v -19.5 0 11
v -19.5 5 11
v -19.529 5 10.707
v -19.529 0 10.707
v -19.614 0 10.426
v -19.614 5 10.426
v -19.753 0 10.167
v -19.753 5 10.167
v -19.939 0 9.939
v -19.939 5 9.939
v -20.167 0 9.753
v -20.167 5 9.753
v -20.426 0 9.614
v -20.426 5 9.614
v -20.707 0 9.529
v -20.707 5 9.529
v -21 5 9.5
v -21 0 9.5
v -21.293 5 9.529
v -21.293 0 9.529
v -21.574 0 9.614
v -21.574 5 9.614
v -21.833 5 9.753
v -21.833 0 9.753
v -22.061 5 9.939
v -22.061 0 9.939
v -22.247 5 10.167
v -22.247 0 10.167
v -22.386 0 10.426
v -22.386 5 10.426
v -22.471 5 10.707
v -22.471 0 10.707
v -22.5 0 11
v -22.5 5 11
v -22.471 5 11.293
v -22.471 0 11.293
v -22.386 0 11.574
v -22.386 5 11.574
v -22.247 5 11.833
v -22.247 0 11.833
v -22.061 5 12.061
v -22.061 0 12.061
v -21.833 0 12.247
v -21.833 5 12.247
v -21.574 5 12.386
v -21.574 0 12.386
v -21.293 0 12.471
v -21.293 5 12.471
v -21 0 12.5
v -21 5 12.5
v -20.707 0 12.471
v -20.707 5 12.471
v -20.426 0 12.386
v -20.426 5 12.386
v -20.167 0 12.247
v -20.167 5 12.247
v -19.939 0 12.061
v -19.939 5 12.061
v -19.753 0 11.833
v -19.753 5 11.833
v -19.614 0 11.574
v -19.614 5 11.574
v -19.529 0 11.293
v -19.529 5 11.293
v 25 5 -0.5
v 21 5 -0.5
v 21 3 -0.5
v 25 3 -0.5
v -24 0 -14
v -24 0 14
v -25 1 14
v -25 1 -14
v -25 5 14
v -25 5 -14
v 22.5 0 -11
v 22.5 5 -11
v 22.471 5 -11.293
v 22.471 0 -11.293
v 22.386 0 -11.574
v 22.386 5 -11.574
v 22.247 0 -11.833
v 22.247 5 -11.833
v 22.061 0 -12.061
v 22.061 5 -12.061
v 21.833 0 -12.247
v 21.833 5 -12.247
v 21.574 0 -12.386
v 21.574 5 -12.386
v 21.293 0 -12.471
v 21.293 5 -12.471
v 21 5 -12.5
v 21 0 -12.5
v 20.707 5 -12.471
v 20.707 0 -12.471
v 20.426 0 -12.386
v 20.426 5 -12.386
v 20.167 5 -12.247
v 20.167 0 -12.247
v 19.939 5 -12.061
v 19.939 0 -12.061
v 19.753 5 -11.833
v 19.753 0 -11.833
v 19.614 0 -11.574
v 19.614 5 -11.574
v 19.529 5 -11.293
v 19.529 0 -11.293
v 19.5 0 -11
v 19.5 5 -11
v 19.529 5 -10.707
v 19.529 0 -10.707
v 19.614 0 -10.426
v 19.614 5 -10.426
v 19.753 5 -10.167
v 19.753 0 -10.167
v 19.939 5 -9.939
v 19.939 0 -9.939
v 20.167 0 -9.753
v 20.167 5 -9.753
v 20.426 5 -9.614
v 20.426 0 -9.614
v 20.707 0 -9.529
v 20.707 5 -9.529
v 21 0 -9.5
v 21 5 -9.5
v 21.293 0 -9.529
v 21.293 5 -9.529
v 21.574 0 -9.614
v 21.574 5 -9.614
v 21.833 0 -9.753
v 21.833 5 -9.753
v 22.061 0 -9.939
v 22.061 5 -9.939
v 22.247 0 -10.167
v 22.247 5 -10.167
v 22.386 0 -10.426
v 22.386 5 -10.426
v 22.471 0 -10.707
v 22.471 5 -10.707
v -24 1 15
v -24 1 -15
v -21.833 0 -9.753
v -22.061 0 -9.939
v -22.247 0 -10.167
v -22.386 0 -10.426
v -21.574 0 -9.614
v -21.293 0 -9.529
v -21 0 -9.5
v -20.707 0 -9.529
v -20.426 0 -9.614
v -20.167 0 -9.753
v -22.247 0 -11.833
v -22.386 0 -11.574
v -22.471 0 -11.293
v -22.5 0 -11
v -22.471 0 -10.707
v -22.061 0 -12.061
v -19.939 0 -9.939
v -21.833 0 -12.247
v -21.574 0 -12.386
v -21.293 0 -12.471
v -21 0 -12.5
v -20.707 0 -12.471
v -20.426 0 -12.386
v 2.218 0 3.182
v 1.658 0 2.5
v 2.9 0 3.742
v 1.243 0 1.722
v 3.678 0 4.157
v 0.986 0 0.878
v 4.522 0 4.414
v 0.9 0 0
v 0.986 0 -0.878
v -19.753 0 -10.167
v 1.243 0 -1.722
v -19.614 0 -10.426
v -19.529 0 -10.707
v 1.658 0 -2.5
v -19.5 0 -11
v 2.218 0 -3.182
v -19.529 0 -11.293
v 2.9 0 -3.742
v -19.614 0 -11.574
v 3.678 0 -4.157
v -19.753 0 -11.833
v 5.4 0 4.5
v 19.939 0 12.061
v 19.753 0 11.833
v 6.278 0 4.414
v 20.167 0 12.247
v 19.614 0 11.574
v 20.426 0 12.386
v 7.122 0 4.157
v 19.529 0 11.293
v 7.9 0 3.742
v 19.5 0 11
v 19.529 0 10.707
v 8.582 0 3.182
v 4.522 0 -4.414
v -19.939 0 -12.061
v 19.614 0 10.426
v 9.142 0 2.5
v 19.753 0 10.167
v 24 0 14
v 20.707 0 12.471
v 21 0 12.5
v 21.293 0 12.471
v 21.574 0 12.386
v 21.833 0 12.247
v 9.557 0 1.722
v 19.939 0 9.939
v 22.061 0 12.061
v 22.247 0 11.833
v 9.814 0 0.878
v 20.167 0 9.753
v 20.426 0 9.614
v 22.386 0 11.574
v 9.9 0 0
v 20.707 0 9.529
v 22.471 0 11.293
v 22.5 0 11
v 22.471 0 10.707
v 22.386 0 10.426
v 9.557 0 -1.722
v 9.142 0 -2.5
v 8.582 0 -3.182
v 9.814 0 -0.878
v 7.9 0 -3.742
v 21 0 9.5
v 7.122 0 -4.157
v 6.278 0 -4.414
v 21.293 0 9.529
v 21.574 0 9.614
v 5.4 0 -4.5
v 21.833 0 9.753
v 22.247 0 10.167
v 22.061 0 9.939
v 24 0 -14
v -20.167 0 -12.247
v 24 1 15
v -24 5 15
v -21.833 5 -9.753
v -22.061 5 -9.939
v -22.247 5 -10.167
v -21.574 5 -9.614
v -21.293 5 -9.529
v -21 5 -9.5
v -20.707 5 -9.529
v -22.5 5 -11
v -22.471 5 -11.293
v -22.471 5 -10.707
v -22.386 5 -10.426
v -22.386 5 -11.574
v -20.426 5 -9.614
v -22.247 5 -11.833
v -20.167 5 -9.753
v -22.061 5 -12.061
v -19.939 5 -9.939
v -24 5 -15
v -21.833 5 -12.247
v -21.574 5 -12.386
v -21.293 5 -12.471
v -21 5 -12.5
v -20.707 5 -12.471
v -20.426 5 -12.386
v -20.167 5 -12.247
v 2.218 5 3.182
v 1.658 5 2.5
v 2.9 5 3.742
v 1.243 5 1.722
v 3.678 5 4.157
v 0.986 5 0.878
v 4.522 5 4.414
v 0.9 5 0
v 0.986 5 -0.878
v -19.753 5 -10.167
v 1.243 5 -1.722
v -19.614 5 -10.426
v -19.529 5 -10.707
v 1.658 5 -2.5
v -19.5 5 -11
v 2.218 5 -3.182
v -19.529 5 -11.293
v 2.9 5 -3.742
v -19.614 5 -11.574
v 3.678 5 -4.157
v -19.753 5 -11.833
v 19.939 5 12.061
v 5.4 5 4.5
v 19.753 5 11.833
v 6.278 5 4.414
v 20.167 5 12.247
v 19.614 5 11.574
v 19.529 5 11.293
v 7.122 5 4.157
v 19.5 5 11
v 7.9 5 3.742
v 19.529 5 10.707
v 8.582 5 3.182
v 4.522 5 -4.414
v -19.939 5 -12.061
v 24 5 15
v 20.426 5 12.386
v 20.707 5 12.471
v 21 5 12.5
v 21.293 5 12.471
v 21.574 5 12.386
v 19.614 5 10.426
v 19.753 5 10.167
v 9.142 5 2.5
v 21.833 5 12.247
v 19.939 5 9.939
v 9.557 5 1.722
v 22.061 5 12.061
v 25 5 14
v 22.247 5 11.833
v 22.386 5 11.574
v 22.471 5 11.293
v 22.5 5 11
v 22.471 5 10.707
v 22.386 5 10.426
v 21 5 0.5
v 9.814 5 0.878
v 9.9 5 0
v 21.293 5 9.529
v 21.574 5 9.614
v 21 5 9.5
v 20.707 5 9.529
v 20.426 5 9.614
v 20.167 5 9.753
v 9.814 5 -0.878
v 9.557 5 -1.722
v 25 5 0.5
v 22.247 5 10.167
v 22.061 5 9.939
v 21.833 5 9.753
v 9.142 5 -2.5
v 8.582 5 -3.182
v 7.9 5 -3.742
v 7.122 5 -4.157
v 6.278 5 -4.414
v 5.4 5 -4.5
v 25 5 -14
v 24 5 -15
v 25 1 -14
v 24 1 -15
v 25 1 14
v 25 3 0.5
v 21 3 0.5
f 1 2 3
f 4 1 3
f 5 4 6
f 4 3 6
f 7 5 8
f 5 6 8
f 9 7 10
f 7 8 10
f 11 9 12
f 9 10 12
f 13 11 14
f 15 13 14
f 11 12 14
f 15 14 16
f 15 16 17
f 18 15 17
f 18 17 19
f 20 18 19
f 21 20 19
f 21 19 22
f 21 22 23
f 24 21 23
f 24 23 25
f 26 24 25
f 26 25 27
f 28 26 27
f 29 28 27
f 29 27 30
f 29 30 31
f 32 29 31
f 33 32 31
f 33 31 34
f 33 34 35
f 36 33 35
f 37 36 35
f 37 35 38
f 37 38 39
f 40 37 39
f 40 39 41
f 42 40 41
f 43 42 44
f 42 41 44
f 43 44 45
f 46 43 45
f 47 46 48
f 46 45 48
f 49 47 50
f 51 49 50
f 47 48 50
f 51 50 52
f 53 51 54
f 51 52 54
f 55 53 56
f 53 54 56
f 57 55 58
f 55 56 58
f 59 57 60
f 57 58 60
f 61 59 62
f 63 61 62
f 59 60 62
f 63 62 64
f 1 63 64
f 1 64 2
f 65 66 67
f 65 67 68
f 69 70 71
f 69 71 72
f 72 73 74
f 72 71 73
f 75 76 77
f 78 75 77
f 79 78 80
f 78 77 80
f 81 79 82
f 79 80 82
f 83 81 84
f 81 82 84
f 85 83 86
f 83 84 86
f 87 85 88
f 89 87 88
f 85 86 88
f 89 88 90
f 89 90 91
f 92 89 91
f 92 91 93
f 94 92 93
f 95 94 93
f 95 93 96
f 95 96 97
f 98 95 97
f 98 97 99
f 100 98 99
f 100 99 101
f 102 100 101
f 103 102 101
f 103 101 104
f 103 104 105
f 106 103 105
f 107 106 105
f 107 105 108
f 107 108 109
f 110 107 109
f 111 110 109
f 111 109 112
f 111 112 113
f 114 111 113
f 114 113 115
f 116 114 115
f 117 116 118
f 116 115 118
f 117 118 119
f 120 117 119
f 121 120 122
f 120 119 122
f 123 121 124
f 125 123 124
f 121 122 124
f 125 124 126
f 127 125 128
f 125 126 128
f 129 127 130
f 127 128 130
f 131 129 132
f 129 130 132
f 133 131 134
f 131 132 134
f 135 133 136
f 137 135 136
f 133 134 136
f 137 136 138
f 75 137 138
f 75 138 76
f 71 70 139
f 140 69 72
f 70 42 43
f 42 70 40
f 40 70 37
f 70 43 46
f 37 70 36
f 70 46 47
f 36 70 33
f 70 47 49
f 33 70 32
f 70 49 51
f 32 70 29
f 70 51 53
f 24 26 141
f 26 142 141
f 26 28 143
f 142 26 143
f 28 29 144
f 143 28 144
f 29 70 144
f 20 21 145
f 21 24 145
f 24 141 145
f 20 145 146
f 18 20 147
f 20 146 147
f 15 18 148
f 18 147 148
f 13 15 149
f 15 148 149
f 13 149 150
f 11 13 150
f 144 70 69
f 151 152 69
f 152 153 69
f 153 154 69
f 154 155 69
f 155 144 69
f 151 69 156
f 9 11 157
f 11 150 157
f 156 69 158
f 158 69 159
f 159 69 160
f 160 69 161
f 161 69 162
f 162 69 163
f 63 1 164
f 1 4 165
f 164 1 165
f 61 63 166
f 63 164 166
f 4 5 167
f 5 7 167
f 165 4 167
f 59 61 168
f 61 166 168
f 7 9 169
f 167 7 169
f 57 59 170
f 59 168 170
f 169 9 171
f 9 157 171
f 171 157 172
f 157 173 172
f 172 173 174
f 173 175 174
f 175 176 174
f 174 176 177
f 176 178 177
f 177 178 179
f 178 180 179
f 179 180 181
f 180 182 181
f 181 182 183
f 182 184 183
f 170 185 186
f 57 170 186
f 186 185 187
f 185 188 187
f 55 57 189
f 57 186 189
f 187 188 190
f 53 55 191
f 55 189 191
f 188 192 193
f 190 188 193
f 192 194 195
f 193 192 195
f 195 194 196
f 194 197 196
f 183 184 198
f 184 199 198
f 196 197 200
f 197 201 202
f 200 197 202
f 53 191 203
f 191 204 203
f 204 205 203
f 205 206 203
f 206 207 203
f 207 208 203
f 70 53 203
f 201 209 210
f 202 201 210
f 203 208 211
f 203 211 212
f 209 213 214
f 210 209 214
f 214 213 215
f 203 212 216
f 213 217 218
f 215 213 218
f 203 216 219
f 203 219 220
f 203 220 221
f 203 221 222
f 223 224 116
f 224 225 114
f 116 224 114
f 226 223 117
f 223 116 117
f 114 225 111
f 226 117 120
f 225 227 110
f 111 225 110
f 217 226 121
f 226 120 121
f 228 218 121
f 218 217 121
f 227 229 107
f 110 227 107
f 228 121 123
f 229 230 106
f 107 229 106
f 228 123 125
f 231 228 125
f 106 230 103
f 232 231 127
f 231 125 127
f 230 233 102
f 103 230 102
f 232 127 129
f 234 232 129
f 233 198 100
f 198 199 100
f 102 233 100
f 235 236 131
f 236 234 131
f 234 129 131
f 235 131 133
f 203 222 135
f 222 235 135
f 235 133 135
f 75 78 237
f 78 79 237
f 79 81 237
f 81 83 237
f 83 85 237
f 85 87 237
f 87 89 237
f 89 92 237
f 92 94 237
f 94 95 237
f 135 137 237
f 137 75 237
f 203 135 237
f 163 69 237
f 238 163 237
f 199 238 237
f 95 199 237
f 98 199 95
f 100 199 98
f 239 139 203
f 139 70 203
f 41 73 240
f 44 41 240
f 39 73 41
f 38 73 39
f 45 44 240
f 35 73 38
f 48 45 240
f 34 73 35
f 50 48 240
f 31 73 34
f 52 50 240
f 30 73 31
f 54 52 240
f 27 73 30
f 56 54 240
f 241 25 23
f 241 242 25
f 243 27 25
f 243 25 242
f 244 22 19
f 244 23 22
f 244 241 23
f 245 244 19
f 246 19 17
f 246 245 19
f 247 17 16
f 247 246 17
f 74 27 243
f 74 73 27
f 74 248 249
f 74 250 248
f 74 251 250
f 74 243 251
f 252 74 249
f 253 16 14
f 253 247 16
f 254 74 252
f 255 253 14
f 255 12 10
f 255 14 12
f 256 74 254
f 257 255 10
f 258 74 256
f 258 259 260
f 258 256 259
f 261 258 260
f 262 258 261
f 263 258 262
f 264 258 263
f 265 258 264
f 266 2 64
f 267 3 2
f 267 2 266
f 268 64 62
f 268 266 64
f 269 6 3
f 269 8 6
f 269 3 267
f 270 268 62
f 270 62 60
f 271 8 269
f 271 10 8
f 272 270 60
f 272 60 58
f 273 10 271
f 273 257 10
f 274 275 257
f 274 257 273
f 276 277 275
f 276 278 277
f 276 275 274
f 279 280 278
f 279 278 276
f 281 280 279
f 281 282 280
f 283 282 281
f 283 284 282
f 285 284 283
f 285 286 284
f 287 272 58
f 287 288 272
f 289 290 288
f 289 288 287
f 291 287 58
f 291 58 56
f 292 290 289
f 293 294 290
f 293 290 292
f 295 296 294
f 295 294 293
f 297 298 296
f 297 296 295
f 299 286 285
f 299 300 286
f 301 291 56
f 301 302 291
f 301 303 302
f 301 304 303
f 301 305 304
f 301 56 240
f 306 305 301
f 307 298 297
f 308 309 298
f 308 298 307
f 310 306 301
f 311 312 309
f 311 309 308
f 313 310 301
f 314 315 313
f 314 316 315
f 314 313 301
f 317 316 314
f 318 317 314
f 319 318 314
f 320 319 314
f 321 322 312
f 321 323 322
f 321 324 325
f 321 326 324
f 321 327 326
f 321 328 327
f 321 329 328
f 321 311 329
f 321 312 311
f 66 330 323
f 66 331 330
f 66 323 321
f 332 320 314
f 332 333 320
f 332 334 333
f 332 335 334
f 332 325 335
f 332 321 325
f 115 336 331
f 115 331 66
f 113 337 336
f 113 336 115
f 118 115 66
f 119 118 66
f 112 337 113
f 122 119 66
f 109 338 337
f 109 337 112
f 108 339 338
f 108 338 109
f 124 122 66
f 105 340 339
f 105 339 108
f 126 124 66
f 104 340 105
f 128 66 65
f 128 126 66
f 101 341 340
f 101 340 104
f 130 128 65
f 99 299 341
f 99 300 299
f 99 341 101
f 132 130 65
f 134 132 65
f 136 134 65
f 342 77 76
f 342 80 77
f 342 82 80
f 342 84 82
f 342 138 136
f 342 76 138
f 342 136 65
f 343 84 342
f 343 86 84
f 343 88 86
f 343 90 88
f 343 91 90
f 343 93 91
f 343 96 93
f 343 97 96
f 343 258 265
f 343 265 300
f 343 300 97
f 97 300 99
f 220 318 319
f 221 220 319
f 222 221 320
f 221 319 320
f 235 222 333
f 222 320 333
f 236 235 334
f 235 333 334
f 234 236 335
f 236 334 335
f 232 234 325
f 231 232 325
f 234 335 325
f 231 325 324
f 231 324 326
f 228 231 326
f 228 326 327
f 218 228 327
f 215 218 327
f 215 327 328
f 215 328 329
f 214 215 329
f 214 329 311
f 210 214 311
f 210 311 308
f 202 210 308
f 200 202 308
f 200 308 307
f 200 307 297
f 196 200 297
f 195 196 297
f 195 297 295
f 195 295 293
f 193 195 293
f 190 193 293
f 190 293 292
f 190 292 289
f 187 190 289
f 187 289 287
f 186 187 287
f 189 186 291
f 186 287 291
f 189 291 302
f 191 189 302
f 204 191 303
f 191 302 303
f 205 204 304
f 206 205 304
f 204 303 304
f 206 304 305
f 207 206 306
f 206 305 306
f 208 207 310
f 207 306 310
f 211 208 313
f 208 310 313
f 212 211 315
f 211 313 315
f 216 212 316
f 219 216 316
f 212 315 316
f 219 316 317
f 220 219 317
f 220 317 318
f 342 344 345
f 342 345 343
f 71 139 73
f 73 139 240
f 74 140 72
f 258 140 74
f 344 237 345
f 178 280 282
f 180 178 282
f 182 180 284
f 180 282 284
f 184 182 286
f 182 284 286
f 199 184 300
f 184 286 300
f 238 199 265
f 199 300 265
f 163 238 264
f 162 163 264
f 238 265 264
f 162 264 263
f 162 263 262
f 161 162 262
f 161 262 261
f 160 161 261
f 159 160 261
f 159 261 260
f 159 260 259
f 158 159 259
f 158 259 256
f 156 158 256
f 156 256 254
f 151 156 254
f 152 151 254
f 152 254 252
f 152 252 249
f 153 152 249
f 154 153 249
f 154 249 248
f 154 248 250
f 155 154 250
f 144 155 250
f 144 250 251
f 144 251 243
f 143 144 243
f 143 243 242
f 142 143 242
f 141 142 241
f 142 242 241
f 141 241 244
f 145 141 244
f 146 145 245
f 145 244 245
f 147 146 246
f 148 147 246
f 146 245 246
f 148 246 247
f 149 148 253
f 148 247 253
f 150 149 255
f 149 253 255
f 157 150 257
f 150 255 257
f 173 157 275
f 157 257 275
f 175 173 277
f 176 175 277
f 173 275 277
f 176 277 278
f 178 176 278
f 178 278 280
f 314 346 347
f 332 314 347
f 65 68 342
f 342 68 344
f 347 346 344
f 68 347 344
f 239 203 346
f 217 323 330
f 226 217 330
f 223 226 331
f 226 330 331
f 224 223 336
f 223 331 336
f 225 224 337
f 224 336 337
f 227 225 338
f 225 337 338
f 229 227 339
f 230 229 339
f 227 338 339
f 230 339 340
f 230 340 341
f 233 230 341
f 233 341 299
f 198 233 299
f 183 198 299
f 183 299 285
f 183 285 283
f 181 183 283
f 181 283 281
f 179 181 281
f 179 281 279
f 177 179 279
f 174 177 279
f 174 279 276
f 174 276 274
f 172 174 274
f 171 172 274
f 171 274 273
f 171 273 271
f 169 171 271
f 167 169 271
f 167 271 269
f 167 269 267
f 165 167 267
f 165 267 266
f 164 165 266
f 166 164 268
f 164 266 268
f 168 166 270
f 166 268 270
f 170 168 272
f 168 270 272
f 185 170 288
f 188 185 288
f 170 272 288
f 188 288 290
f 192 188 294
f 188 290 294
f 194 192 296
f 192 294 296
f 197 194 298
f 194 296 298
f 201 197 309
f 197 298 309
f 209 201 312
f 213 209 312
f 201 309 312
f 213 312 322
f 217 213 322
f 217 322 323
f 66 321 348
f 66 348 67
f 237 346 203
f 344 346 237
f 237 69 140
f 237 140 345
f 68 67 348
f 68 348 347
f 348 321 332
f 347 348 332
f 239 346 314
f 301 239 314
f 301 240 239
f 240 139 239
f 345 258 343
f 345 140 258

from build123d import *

# Parameters (mm, degrees)
SKETCH1_W           = 50
SKETCH1_H           = 30
BOSS_EXTRUDE1_DEPTH = 5
SKETCH2_W           = 4
SKETCH2_H           = 1
CUT_EXTRUDE1_DEPTH  = 2
SKETCH3_R           = 4.5
CUT_EXTRUDE2_DEPTH  = 22
SKETCH3_3_R         = 4.5
SKETCH3_3_R_2       = 1.5
CUT_EXTRUDE3_DEPTH  = 22
CHAMFER1_SIZE       = 1


with BuildPart() as part:
    # Sketch1 → Boss-Extrude1 (new body)
    with BuildSketch(Plane(origin=(0, 0, 0), x_dir=(1, 0, 0), z_dir=(0, 1, 0))):
        Rectangle(SKETCH1_W, SKETCH1_H)
    extrude(amount=BOSS_EXTRUDE1_DEPTH)

    # Sketch2 → Cut-Extrude1 (cut)
    with BuildSketch(Plane(origin=(0, 5, 0), x_dir=(1, 0, 0), z_dir=(0, 1, 0))):
        with Locations((23, 0)):
            Rectangle(SKETCH2_W, SKETCH2_H)
    extrude(amount=-CUT_EXTRUDE1_DEPTH, mode=Mode.SUBTRACT)

    # Sketch3 → Cut-Extrude2 (cut)
    with BuildSketch(Plane(origin=(0, 5, 0), x_dir=(1, 0, 0), z_dir=(0, 1, 0))):
        with Locations((5.4, 0)):
            Circle(SKETCH3_R)
    extrude(amount=-CUT_EXTRUDE2_DEPTH, mode=Mode.SUBTRACT)

    # Sketch3<3> → Cut-Extrude3 (cut)
    with BuildSketch(Plane(origin=(0, 5, 0), x_dir=(1, 0, 0), z_dir=(0, 1, 0))):
        with Locations((5.4, 0)):
            Circle(SKETCH3_3_R)
        with Locations((-21, 11)):
            Circle(SKETCH3_3_R_2)
        with Locations((21, 11)):
            Circle(SKETCH3_3_R_2)
        with Locations((21, -11)):
            Circle(SKETCH3_3_R_2)
        with Locations((-21, -11)):
            Circle(SKETCH3_3_R_2)
    extrude(amount=-CUT_EXTRUDE3_DEPTH, mode=Mode.SUBTRACT)

    # Chamfer1
    chamfer1_edges = [part.edges().sort_by_distance(p)[0] for p in [
        (0, 0, 15),
        (-25, 0, 0),
        (0, 0, -15),
        (25, 0, 0),
        (25, 2.5, 15),
        (-25, 2.5, 15),
        (-25, 2.5, -15),
        (25, 2.5, -15),
    ]]
    chamfer(chamfer1_edges, length=CHAMFER1_SIZE)


solid = part.part
